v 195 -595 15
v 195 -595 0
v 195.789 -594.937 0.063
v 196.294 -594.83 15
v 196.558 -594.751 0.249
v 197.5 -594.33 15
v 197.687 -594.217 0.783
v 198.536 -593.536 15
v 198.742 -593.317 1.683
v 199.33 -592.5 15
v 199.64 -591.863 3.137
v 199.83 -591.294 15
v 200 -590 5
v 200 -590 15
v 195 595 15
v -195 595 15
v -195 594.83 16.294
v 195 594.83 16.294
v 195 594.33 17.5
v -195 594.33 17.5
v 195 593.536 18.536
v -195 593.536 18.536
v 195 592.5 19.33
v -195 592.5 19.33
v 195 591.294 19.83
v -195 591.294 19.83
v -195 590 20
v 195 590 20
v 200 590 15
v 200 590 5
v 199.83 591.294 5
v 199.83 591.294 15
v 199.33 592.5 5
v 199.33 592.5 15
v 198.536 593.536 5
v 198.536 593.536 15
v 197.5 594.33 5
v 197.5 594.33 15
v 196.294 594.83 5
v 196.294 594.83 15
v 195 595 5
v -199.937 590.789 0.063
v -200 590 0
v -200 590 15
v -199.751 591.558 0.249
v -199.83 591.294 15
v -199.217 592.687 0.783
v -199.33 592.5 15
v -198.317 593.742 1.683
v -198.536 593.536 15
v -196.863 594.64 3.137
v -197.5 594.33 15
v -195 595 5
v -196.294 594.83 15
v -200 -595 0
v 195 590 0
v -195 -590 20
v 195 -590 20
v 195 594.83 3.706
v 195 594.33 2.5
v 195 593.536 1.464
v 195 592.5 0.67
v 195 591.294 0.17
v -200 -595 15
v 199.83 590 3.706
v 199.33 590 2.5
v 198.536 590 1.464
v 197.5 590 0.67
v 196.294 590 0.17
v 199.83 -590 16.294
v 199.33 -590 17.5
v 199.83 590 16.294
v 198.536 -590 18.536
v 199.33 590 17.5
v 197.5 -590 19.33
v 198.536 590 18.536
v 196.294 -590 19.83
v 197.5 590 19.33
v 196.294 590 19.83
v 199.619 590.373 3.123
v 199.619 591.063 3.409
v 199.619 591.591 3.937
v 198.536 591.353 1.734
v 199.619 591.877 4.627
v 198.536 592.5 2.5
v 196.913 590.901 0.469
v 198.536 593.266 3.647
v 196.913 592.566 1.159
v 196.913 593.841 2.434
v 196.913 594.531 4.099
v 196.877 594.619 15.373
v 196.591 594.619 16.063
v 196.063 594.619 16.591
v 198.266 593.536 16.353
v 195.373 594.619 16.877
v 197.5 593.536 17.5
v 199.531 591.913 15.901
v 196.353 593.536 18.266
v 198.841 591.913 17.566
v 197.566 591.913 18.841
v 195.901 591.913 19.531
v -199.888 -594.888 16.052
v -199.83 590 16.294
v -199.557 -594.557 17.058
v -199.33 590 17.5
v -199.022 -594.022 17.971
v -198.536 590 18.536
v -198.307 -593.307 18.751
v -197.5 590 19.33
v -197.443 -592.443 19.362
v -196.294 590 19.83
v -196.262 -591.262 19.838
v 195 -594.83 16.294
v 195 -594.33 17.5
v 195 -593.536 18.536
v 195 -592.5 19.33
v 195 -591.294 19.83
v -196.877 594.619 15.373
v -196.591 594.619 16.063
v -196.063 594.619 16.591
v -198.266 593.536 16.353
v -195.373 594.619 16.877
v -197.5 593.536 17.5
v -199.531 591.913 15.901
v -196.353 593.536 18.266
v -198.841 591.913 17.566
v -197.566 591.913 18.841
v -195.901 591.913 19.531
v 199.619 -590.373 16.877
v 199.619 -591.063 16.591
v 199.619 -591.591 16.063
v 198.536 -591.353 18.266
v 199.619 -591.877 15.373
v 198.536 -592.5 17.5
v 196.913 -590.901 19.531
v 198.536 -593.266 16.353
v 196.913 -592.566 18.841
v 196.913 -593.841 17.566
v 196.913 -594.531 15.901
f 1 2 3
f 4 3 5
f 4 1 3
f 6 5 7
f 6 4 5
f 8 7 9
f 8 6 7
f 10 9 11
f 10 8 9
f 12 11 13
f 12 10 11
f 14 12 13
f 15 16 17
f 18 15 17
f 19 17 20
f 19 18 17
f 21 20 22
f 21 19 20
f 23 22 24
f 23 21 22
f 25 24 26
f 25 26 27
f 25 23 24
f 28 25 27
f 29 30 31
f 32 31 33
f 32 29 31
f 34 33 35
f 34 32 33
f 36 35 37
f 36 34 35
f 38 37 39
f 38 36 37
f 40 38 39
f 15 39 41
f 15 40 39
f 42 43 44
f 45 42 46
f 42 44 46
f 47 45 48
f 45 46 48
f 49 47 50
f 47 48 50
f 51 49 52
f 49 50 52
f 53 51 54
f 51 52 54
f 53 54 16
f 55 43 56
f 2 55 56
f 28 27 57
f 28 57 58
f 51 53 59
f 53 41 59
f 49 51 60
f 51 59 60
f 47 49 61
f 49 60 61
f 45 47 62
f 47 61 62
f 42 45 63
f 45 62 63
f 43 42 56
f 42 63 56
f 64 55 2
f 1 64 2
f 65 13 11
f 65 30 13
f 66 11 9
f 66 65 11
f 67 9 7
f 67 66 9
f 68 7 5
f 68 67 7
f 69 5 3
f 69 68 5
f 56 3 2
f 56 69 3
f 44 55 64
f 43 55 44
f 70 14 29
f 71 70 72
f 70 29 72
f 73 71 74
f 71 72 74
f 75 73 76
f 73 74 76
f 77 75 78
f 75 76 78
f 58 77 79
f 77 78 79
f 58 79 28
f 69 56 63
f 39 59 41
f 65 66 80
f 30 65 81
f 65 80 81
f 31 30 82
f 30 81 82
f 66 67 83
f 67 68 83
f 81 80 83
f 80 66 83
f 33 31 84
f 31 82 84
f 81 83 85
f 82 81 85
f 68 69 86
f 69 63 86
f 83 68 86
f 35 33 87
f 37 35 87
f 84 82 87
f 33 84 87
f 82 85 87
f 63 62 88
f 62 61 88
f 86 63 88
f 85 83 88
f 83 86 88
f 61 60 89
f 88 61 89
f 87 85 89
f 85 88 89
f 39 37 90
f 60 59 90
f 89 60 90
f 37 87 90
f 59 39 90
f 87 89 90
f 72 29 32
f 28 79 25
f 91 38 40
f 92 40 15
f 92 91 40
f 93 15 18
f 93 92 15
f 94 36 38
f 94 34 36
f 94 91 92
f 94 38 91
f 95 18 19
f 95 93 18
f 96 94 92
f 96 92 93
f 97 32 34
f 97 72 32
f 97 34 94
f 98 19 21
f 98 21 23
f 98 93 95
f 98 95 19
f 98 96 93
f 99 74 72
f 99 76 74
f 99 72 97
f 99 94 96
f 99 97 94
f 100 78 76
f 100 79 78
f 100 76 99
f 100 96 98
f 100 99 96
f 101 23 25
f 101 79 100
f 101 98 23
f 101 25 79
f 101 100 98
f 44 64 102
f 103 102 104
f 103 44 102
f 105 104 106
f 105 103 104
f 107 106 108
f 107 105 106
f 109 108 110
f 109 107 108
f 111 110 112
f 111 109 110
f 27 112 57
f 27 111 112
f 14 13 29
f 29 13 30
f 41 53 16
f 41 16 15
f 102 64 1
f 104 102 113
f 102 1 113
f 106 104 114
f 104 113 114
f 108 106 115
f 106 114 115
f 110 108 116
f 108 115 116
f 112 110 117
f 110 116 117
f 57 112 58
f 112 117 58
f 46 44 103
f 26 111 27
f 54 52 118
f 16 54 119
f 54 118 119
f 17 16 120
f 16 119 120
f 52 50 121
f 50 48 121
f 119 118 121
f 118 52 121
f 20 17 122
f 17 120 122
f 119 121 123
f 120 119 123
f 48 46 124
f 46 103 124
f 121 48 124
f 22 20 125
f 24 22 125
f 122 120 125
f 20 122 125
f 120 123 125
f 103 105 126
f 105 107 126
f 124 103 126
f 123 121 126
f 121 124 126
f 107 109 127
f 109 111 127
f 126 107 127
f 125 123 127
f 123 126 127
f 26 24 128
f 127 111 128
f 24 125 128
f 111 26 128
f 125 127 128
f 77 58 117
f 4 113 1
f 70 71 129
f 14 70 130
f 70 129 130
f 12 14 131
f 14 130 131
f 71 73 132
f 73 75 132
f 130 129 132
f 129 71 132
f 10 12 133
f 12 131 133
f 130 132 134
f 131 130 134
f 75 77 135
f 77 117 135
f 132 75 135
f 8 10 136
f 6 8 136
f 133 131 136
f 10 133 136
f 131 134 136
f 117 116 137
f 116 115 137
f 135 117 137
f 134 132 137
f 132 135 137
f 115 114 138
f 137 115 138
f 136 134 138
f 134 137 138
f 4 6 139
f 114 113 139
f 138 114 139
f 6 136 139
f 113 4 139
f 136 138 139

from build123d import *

# Parameters (mm, degrees)
SKETCH1_W           = 400
SKETCH1_H           = 1190
BOSS_EXTRUDE1_DEPTH = 20
FILLET1_R           = 5


with BuildPart() as part:
    # Sketch1 → Boss-Extrude1 (new body)
    with BuildSketch(Plane.XY):
        Rectangle(SKETCH1_W, SKETCH1_H)
    extrude(amount=BOSS_EXTRUDE1_DEPTH)

    # Fillet1
    fillet1_edges = [part.edges().sort_by_distance(p)[0] for p in [
        (-200, 0, 20),
        (0, -595, 20),
        (200, 0, 20),
        (0, 595, 0),
        (200, 0, 0),
        (200, -595, 10),
        (-200, 595, 10),
        (200, 595, 10),
        (0, 595, 20),
    ]]
    fillet(fillet1_edges, radius=FILLET1_R)


solid = part.part
